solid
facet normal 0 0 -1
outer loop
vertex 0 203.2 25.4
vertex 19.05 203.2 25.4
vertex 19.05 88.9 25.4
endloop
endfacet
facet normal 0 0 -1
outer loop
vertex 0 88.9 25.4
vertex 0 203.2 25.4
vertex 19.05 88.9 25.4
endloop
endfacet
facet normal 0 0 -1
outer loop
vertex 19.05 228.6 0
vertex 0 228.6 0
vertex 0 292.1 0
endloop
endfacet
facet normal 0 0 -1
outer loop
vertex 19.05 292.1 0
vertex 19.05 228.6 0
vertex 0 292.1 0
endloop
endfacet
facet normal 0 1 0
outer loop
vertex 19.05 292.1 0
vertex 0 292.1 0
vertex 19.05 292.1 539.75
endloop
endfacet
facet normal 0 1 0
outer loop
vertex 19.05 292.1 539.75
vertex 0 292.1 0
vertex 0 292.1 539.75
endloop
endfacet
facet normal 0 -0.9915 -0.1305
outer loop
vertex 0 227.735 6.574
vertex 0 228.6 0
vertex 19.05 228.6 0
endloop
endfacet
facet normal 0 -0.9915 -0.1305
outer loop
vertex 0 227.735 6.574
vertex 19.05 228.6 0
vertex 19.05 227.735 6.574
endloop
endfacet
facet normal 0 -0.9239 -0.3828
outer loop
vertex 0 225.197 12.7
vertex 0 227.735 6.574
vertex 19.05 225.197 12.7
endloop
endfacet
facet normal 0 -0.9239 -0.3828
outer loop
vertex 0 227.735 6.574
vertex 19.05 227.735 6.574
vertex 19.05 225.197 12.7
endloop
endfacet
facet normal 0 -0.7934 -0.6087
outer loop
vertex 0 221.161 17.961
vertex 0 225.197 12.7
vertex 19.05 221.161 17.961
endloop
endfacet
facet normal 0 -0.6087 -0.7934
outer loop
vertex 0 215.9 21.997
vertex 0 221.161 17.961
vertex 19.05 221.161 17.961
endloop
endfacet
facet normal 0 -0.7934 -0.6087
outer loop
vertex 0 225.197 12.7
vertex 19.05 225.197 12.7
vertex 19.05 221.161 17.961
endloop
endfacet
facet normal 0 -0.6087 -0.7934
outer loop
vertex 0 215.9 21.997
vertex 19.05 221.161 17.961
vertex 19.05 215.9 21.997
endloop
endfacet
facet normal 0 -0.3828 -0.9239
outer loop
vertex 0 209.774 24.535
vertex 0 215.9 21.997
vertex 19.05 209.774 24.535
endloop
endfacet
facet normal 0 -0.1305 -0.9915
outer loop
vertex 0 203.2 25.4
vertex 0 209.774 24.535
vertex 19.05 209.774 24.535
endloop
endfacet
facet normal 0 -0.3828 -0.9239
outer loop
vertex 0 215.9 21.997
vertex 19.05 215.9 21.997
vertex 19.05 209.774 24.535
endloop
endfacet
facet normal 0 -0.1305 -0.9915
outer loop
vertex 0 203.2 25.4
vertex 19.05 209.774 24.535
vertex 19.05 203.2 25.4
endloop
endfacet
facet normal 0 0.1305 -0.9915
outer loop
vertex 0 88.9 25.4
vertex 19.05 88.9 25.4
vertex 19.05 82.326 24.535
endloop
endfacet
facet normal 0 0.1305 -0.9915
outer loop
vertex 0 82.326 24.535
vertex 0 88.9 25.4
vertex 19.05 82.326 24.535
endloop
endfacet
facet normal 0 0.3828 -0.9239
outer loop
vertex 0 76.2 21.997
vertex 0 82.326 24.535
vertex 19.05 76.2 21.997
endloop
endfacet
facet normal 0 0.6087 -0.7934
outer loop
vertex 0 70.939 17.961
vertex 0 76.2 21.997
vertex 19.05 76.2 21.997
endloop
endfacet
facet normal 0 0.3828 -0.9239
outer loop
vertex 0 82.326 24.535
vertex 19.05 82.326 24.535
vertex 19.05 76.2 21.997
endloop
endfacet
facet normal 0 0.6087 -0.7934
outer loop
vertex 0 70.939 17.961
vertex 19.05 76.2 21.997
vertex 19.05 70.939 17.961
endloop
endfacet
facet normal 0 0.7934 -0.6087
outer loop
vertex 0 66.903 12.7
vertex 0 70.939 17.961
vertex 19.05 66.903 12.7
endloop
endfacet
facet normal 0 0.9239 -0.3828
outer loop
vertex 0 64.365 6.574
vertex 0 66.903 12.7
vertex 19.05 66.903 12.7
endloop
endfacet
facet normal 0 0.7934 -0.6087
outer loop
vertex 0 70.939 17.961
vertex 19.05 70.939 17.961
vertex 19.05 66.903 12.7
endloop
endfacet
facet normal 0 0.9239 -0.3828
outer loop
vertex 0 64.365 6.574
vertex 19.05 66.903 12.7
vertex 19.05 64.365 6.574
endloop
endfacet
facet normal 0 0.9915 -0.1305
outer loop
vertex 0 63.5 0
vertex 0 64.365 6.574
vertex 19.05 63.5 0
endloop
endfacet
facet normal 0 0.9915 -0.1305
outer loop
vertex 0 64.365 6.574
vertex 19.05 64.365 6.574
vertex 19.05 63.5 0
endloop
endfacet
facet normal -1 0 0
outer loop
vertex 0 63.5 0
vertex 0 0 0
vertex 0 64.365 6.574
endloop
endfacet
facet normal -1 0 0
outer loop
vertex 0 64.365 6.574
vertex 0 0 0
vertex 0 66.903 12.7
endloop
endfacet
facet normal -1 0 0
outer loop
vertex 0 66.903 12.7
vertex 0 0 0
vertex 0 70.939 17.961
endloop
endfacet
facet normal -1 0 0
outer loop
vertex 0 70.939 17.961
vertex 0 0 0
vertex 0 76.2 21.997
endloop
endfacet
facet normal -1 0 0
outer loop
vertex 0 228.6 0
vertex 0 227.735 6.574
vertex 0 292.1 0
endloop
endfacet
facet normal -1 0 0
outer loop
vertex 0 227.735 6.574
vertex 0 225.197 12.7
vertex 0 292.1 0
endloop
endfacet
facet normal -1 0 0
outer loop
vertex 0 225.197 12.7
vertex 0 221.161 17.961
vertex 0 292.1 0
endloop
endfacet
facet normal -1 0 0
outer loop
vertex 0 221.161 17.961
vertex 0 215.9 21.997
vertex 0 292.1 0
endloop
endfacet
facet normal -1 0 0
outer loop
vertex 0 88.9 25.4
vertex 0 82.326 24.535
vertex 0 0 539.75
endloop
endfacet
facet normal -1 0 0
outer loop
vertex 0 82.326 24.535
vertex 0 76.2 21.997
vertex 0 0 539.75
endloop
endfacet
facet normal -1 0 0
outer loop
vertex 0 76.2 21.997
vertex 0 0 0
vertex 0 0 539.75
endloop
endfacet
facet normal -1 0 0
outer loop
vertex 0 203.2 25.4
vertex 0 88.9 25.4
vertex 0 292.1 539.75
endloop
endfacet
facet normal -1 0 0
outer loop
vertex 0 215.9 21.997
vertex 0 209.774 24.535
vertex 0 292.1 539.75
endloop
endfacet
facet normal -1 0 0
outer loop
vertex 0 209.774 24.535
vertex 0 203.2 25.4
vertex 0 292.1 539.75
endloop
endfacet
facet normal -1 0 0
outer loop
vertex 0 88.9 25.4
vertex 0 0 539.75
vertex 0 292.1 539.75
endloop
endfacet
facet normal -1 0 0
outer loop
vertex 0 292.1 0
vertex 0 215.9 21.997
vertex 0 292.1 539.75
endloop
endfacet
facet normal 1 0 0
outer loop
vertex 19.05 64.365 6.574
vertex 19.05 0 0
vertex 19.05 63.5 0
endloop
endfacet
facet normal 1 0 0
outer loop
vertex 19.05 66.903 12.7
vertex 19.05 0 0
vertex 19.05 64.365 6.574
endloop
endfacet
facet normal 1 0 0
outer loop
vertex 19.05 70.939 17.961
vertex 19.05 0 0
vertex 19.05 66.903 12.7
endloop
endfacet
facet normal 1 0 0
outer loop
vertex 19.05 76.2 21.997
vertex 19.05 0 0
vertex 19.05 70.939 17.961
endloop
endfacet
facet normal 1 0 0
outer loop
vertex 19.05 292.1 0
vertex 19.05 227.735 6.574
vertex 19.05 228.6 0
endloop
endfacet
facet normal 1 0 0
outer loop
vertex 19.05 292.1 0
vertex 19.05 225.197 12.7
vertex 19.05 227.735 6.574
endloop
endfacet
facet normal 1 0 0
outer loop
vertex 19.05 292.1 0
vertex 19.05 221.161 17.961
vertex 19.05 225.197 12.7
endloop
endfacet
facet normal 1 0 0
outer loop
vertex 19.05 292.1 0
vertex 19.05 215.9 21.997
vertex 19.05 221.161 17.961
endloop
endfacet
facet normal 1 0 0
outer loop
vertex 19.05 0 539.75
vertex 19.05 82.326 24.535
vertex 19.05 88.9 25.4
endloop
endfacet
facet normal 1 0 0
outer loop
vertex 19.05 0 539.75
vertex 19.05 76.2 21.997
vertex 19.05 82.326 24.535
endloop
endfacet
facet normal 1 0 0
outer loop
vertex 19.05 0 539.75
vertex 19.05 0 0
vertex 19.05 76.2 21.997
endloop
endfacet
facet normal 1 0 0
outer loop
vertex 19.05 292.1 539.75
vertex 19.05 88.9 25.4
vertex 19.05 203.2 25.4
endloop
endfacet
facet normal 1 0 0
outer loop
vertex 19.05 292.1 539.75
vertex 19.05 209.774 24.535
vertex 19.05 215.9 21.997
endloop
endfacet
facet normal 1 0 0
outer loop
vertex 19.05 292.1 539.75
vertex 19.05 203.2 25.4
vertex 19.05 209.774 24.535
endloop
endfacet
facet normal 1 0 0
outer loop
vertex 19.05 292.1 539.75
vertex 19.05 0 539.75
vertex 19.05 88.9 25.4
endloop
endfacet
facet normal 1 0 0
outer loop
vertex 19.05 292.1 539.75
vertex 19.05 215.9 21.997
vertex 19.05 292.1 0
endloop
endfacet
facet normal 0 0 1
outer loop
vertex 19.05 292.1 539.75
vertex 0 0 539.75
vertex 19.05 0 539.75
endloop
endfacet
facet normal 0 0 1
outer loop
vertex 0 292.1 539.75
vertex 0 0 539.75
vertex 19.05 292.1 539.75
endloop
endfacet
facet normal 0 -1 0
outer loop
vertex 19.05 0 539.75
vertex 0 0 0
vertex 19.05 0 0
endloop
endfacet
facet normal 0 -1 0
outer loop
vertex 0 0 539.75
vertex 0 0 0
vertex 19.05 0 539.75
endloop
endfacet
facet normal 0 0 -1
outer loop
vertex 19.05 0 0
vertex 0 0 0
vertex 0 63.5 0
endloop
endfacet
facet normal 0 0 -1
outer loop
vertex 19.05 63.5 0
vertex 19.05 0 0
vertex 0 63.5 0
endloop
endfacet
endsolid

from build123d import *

# Parameters (mm, degrees)
F0_W     = 292.1
F0_H     = 539.75
F1_DEPTH = 19.05
F3_DEPTH = 19.05


with BuildPart() as f1:
    # F0 (on Right) → F1 (new body)
    with BuildSketch(Plane.YZ):
        with Locations((146.05, 269.875)):
            Rectangle(F0_W, F0_H)
    extrude(amount=F1_DEPTH)

    # F2 (on face) → F3 (cut)
    with BuildSketch(Plane.YZ.offset(19.05)):
        with BuildLine():
            Line((146.05, 25.4), (88.9, 25.4))
            ThreePointArc((88.9, 25.4), (70.939488, 17.960512), (63.5, 0))
            Line((63.5, 0), (228.6, 0))
            ThreePointArc((228.6, 0), (221.160512, 17.960512), (203.2, 25.4))
            Line((203.2, 25.4), (146.05, 25.4))
        make_face()
    extrude(amount=-F3_DEPTH, mode=Mode.SUBTRACT)


solid = f1.part
